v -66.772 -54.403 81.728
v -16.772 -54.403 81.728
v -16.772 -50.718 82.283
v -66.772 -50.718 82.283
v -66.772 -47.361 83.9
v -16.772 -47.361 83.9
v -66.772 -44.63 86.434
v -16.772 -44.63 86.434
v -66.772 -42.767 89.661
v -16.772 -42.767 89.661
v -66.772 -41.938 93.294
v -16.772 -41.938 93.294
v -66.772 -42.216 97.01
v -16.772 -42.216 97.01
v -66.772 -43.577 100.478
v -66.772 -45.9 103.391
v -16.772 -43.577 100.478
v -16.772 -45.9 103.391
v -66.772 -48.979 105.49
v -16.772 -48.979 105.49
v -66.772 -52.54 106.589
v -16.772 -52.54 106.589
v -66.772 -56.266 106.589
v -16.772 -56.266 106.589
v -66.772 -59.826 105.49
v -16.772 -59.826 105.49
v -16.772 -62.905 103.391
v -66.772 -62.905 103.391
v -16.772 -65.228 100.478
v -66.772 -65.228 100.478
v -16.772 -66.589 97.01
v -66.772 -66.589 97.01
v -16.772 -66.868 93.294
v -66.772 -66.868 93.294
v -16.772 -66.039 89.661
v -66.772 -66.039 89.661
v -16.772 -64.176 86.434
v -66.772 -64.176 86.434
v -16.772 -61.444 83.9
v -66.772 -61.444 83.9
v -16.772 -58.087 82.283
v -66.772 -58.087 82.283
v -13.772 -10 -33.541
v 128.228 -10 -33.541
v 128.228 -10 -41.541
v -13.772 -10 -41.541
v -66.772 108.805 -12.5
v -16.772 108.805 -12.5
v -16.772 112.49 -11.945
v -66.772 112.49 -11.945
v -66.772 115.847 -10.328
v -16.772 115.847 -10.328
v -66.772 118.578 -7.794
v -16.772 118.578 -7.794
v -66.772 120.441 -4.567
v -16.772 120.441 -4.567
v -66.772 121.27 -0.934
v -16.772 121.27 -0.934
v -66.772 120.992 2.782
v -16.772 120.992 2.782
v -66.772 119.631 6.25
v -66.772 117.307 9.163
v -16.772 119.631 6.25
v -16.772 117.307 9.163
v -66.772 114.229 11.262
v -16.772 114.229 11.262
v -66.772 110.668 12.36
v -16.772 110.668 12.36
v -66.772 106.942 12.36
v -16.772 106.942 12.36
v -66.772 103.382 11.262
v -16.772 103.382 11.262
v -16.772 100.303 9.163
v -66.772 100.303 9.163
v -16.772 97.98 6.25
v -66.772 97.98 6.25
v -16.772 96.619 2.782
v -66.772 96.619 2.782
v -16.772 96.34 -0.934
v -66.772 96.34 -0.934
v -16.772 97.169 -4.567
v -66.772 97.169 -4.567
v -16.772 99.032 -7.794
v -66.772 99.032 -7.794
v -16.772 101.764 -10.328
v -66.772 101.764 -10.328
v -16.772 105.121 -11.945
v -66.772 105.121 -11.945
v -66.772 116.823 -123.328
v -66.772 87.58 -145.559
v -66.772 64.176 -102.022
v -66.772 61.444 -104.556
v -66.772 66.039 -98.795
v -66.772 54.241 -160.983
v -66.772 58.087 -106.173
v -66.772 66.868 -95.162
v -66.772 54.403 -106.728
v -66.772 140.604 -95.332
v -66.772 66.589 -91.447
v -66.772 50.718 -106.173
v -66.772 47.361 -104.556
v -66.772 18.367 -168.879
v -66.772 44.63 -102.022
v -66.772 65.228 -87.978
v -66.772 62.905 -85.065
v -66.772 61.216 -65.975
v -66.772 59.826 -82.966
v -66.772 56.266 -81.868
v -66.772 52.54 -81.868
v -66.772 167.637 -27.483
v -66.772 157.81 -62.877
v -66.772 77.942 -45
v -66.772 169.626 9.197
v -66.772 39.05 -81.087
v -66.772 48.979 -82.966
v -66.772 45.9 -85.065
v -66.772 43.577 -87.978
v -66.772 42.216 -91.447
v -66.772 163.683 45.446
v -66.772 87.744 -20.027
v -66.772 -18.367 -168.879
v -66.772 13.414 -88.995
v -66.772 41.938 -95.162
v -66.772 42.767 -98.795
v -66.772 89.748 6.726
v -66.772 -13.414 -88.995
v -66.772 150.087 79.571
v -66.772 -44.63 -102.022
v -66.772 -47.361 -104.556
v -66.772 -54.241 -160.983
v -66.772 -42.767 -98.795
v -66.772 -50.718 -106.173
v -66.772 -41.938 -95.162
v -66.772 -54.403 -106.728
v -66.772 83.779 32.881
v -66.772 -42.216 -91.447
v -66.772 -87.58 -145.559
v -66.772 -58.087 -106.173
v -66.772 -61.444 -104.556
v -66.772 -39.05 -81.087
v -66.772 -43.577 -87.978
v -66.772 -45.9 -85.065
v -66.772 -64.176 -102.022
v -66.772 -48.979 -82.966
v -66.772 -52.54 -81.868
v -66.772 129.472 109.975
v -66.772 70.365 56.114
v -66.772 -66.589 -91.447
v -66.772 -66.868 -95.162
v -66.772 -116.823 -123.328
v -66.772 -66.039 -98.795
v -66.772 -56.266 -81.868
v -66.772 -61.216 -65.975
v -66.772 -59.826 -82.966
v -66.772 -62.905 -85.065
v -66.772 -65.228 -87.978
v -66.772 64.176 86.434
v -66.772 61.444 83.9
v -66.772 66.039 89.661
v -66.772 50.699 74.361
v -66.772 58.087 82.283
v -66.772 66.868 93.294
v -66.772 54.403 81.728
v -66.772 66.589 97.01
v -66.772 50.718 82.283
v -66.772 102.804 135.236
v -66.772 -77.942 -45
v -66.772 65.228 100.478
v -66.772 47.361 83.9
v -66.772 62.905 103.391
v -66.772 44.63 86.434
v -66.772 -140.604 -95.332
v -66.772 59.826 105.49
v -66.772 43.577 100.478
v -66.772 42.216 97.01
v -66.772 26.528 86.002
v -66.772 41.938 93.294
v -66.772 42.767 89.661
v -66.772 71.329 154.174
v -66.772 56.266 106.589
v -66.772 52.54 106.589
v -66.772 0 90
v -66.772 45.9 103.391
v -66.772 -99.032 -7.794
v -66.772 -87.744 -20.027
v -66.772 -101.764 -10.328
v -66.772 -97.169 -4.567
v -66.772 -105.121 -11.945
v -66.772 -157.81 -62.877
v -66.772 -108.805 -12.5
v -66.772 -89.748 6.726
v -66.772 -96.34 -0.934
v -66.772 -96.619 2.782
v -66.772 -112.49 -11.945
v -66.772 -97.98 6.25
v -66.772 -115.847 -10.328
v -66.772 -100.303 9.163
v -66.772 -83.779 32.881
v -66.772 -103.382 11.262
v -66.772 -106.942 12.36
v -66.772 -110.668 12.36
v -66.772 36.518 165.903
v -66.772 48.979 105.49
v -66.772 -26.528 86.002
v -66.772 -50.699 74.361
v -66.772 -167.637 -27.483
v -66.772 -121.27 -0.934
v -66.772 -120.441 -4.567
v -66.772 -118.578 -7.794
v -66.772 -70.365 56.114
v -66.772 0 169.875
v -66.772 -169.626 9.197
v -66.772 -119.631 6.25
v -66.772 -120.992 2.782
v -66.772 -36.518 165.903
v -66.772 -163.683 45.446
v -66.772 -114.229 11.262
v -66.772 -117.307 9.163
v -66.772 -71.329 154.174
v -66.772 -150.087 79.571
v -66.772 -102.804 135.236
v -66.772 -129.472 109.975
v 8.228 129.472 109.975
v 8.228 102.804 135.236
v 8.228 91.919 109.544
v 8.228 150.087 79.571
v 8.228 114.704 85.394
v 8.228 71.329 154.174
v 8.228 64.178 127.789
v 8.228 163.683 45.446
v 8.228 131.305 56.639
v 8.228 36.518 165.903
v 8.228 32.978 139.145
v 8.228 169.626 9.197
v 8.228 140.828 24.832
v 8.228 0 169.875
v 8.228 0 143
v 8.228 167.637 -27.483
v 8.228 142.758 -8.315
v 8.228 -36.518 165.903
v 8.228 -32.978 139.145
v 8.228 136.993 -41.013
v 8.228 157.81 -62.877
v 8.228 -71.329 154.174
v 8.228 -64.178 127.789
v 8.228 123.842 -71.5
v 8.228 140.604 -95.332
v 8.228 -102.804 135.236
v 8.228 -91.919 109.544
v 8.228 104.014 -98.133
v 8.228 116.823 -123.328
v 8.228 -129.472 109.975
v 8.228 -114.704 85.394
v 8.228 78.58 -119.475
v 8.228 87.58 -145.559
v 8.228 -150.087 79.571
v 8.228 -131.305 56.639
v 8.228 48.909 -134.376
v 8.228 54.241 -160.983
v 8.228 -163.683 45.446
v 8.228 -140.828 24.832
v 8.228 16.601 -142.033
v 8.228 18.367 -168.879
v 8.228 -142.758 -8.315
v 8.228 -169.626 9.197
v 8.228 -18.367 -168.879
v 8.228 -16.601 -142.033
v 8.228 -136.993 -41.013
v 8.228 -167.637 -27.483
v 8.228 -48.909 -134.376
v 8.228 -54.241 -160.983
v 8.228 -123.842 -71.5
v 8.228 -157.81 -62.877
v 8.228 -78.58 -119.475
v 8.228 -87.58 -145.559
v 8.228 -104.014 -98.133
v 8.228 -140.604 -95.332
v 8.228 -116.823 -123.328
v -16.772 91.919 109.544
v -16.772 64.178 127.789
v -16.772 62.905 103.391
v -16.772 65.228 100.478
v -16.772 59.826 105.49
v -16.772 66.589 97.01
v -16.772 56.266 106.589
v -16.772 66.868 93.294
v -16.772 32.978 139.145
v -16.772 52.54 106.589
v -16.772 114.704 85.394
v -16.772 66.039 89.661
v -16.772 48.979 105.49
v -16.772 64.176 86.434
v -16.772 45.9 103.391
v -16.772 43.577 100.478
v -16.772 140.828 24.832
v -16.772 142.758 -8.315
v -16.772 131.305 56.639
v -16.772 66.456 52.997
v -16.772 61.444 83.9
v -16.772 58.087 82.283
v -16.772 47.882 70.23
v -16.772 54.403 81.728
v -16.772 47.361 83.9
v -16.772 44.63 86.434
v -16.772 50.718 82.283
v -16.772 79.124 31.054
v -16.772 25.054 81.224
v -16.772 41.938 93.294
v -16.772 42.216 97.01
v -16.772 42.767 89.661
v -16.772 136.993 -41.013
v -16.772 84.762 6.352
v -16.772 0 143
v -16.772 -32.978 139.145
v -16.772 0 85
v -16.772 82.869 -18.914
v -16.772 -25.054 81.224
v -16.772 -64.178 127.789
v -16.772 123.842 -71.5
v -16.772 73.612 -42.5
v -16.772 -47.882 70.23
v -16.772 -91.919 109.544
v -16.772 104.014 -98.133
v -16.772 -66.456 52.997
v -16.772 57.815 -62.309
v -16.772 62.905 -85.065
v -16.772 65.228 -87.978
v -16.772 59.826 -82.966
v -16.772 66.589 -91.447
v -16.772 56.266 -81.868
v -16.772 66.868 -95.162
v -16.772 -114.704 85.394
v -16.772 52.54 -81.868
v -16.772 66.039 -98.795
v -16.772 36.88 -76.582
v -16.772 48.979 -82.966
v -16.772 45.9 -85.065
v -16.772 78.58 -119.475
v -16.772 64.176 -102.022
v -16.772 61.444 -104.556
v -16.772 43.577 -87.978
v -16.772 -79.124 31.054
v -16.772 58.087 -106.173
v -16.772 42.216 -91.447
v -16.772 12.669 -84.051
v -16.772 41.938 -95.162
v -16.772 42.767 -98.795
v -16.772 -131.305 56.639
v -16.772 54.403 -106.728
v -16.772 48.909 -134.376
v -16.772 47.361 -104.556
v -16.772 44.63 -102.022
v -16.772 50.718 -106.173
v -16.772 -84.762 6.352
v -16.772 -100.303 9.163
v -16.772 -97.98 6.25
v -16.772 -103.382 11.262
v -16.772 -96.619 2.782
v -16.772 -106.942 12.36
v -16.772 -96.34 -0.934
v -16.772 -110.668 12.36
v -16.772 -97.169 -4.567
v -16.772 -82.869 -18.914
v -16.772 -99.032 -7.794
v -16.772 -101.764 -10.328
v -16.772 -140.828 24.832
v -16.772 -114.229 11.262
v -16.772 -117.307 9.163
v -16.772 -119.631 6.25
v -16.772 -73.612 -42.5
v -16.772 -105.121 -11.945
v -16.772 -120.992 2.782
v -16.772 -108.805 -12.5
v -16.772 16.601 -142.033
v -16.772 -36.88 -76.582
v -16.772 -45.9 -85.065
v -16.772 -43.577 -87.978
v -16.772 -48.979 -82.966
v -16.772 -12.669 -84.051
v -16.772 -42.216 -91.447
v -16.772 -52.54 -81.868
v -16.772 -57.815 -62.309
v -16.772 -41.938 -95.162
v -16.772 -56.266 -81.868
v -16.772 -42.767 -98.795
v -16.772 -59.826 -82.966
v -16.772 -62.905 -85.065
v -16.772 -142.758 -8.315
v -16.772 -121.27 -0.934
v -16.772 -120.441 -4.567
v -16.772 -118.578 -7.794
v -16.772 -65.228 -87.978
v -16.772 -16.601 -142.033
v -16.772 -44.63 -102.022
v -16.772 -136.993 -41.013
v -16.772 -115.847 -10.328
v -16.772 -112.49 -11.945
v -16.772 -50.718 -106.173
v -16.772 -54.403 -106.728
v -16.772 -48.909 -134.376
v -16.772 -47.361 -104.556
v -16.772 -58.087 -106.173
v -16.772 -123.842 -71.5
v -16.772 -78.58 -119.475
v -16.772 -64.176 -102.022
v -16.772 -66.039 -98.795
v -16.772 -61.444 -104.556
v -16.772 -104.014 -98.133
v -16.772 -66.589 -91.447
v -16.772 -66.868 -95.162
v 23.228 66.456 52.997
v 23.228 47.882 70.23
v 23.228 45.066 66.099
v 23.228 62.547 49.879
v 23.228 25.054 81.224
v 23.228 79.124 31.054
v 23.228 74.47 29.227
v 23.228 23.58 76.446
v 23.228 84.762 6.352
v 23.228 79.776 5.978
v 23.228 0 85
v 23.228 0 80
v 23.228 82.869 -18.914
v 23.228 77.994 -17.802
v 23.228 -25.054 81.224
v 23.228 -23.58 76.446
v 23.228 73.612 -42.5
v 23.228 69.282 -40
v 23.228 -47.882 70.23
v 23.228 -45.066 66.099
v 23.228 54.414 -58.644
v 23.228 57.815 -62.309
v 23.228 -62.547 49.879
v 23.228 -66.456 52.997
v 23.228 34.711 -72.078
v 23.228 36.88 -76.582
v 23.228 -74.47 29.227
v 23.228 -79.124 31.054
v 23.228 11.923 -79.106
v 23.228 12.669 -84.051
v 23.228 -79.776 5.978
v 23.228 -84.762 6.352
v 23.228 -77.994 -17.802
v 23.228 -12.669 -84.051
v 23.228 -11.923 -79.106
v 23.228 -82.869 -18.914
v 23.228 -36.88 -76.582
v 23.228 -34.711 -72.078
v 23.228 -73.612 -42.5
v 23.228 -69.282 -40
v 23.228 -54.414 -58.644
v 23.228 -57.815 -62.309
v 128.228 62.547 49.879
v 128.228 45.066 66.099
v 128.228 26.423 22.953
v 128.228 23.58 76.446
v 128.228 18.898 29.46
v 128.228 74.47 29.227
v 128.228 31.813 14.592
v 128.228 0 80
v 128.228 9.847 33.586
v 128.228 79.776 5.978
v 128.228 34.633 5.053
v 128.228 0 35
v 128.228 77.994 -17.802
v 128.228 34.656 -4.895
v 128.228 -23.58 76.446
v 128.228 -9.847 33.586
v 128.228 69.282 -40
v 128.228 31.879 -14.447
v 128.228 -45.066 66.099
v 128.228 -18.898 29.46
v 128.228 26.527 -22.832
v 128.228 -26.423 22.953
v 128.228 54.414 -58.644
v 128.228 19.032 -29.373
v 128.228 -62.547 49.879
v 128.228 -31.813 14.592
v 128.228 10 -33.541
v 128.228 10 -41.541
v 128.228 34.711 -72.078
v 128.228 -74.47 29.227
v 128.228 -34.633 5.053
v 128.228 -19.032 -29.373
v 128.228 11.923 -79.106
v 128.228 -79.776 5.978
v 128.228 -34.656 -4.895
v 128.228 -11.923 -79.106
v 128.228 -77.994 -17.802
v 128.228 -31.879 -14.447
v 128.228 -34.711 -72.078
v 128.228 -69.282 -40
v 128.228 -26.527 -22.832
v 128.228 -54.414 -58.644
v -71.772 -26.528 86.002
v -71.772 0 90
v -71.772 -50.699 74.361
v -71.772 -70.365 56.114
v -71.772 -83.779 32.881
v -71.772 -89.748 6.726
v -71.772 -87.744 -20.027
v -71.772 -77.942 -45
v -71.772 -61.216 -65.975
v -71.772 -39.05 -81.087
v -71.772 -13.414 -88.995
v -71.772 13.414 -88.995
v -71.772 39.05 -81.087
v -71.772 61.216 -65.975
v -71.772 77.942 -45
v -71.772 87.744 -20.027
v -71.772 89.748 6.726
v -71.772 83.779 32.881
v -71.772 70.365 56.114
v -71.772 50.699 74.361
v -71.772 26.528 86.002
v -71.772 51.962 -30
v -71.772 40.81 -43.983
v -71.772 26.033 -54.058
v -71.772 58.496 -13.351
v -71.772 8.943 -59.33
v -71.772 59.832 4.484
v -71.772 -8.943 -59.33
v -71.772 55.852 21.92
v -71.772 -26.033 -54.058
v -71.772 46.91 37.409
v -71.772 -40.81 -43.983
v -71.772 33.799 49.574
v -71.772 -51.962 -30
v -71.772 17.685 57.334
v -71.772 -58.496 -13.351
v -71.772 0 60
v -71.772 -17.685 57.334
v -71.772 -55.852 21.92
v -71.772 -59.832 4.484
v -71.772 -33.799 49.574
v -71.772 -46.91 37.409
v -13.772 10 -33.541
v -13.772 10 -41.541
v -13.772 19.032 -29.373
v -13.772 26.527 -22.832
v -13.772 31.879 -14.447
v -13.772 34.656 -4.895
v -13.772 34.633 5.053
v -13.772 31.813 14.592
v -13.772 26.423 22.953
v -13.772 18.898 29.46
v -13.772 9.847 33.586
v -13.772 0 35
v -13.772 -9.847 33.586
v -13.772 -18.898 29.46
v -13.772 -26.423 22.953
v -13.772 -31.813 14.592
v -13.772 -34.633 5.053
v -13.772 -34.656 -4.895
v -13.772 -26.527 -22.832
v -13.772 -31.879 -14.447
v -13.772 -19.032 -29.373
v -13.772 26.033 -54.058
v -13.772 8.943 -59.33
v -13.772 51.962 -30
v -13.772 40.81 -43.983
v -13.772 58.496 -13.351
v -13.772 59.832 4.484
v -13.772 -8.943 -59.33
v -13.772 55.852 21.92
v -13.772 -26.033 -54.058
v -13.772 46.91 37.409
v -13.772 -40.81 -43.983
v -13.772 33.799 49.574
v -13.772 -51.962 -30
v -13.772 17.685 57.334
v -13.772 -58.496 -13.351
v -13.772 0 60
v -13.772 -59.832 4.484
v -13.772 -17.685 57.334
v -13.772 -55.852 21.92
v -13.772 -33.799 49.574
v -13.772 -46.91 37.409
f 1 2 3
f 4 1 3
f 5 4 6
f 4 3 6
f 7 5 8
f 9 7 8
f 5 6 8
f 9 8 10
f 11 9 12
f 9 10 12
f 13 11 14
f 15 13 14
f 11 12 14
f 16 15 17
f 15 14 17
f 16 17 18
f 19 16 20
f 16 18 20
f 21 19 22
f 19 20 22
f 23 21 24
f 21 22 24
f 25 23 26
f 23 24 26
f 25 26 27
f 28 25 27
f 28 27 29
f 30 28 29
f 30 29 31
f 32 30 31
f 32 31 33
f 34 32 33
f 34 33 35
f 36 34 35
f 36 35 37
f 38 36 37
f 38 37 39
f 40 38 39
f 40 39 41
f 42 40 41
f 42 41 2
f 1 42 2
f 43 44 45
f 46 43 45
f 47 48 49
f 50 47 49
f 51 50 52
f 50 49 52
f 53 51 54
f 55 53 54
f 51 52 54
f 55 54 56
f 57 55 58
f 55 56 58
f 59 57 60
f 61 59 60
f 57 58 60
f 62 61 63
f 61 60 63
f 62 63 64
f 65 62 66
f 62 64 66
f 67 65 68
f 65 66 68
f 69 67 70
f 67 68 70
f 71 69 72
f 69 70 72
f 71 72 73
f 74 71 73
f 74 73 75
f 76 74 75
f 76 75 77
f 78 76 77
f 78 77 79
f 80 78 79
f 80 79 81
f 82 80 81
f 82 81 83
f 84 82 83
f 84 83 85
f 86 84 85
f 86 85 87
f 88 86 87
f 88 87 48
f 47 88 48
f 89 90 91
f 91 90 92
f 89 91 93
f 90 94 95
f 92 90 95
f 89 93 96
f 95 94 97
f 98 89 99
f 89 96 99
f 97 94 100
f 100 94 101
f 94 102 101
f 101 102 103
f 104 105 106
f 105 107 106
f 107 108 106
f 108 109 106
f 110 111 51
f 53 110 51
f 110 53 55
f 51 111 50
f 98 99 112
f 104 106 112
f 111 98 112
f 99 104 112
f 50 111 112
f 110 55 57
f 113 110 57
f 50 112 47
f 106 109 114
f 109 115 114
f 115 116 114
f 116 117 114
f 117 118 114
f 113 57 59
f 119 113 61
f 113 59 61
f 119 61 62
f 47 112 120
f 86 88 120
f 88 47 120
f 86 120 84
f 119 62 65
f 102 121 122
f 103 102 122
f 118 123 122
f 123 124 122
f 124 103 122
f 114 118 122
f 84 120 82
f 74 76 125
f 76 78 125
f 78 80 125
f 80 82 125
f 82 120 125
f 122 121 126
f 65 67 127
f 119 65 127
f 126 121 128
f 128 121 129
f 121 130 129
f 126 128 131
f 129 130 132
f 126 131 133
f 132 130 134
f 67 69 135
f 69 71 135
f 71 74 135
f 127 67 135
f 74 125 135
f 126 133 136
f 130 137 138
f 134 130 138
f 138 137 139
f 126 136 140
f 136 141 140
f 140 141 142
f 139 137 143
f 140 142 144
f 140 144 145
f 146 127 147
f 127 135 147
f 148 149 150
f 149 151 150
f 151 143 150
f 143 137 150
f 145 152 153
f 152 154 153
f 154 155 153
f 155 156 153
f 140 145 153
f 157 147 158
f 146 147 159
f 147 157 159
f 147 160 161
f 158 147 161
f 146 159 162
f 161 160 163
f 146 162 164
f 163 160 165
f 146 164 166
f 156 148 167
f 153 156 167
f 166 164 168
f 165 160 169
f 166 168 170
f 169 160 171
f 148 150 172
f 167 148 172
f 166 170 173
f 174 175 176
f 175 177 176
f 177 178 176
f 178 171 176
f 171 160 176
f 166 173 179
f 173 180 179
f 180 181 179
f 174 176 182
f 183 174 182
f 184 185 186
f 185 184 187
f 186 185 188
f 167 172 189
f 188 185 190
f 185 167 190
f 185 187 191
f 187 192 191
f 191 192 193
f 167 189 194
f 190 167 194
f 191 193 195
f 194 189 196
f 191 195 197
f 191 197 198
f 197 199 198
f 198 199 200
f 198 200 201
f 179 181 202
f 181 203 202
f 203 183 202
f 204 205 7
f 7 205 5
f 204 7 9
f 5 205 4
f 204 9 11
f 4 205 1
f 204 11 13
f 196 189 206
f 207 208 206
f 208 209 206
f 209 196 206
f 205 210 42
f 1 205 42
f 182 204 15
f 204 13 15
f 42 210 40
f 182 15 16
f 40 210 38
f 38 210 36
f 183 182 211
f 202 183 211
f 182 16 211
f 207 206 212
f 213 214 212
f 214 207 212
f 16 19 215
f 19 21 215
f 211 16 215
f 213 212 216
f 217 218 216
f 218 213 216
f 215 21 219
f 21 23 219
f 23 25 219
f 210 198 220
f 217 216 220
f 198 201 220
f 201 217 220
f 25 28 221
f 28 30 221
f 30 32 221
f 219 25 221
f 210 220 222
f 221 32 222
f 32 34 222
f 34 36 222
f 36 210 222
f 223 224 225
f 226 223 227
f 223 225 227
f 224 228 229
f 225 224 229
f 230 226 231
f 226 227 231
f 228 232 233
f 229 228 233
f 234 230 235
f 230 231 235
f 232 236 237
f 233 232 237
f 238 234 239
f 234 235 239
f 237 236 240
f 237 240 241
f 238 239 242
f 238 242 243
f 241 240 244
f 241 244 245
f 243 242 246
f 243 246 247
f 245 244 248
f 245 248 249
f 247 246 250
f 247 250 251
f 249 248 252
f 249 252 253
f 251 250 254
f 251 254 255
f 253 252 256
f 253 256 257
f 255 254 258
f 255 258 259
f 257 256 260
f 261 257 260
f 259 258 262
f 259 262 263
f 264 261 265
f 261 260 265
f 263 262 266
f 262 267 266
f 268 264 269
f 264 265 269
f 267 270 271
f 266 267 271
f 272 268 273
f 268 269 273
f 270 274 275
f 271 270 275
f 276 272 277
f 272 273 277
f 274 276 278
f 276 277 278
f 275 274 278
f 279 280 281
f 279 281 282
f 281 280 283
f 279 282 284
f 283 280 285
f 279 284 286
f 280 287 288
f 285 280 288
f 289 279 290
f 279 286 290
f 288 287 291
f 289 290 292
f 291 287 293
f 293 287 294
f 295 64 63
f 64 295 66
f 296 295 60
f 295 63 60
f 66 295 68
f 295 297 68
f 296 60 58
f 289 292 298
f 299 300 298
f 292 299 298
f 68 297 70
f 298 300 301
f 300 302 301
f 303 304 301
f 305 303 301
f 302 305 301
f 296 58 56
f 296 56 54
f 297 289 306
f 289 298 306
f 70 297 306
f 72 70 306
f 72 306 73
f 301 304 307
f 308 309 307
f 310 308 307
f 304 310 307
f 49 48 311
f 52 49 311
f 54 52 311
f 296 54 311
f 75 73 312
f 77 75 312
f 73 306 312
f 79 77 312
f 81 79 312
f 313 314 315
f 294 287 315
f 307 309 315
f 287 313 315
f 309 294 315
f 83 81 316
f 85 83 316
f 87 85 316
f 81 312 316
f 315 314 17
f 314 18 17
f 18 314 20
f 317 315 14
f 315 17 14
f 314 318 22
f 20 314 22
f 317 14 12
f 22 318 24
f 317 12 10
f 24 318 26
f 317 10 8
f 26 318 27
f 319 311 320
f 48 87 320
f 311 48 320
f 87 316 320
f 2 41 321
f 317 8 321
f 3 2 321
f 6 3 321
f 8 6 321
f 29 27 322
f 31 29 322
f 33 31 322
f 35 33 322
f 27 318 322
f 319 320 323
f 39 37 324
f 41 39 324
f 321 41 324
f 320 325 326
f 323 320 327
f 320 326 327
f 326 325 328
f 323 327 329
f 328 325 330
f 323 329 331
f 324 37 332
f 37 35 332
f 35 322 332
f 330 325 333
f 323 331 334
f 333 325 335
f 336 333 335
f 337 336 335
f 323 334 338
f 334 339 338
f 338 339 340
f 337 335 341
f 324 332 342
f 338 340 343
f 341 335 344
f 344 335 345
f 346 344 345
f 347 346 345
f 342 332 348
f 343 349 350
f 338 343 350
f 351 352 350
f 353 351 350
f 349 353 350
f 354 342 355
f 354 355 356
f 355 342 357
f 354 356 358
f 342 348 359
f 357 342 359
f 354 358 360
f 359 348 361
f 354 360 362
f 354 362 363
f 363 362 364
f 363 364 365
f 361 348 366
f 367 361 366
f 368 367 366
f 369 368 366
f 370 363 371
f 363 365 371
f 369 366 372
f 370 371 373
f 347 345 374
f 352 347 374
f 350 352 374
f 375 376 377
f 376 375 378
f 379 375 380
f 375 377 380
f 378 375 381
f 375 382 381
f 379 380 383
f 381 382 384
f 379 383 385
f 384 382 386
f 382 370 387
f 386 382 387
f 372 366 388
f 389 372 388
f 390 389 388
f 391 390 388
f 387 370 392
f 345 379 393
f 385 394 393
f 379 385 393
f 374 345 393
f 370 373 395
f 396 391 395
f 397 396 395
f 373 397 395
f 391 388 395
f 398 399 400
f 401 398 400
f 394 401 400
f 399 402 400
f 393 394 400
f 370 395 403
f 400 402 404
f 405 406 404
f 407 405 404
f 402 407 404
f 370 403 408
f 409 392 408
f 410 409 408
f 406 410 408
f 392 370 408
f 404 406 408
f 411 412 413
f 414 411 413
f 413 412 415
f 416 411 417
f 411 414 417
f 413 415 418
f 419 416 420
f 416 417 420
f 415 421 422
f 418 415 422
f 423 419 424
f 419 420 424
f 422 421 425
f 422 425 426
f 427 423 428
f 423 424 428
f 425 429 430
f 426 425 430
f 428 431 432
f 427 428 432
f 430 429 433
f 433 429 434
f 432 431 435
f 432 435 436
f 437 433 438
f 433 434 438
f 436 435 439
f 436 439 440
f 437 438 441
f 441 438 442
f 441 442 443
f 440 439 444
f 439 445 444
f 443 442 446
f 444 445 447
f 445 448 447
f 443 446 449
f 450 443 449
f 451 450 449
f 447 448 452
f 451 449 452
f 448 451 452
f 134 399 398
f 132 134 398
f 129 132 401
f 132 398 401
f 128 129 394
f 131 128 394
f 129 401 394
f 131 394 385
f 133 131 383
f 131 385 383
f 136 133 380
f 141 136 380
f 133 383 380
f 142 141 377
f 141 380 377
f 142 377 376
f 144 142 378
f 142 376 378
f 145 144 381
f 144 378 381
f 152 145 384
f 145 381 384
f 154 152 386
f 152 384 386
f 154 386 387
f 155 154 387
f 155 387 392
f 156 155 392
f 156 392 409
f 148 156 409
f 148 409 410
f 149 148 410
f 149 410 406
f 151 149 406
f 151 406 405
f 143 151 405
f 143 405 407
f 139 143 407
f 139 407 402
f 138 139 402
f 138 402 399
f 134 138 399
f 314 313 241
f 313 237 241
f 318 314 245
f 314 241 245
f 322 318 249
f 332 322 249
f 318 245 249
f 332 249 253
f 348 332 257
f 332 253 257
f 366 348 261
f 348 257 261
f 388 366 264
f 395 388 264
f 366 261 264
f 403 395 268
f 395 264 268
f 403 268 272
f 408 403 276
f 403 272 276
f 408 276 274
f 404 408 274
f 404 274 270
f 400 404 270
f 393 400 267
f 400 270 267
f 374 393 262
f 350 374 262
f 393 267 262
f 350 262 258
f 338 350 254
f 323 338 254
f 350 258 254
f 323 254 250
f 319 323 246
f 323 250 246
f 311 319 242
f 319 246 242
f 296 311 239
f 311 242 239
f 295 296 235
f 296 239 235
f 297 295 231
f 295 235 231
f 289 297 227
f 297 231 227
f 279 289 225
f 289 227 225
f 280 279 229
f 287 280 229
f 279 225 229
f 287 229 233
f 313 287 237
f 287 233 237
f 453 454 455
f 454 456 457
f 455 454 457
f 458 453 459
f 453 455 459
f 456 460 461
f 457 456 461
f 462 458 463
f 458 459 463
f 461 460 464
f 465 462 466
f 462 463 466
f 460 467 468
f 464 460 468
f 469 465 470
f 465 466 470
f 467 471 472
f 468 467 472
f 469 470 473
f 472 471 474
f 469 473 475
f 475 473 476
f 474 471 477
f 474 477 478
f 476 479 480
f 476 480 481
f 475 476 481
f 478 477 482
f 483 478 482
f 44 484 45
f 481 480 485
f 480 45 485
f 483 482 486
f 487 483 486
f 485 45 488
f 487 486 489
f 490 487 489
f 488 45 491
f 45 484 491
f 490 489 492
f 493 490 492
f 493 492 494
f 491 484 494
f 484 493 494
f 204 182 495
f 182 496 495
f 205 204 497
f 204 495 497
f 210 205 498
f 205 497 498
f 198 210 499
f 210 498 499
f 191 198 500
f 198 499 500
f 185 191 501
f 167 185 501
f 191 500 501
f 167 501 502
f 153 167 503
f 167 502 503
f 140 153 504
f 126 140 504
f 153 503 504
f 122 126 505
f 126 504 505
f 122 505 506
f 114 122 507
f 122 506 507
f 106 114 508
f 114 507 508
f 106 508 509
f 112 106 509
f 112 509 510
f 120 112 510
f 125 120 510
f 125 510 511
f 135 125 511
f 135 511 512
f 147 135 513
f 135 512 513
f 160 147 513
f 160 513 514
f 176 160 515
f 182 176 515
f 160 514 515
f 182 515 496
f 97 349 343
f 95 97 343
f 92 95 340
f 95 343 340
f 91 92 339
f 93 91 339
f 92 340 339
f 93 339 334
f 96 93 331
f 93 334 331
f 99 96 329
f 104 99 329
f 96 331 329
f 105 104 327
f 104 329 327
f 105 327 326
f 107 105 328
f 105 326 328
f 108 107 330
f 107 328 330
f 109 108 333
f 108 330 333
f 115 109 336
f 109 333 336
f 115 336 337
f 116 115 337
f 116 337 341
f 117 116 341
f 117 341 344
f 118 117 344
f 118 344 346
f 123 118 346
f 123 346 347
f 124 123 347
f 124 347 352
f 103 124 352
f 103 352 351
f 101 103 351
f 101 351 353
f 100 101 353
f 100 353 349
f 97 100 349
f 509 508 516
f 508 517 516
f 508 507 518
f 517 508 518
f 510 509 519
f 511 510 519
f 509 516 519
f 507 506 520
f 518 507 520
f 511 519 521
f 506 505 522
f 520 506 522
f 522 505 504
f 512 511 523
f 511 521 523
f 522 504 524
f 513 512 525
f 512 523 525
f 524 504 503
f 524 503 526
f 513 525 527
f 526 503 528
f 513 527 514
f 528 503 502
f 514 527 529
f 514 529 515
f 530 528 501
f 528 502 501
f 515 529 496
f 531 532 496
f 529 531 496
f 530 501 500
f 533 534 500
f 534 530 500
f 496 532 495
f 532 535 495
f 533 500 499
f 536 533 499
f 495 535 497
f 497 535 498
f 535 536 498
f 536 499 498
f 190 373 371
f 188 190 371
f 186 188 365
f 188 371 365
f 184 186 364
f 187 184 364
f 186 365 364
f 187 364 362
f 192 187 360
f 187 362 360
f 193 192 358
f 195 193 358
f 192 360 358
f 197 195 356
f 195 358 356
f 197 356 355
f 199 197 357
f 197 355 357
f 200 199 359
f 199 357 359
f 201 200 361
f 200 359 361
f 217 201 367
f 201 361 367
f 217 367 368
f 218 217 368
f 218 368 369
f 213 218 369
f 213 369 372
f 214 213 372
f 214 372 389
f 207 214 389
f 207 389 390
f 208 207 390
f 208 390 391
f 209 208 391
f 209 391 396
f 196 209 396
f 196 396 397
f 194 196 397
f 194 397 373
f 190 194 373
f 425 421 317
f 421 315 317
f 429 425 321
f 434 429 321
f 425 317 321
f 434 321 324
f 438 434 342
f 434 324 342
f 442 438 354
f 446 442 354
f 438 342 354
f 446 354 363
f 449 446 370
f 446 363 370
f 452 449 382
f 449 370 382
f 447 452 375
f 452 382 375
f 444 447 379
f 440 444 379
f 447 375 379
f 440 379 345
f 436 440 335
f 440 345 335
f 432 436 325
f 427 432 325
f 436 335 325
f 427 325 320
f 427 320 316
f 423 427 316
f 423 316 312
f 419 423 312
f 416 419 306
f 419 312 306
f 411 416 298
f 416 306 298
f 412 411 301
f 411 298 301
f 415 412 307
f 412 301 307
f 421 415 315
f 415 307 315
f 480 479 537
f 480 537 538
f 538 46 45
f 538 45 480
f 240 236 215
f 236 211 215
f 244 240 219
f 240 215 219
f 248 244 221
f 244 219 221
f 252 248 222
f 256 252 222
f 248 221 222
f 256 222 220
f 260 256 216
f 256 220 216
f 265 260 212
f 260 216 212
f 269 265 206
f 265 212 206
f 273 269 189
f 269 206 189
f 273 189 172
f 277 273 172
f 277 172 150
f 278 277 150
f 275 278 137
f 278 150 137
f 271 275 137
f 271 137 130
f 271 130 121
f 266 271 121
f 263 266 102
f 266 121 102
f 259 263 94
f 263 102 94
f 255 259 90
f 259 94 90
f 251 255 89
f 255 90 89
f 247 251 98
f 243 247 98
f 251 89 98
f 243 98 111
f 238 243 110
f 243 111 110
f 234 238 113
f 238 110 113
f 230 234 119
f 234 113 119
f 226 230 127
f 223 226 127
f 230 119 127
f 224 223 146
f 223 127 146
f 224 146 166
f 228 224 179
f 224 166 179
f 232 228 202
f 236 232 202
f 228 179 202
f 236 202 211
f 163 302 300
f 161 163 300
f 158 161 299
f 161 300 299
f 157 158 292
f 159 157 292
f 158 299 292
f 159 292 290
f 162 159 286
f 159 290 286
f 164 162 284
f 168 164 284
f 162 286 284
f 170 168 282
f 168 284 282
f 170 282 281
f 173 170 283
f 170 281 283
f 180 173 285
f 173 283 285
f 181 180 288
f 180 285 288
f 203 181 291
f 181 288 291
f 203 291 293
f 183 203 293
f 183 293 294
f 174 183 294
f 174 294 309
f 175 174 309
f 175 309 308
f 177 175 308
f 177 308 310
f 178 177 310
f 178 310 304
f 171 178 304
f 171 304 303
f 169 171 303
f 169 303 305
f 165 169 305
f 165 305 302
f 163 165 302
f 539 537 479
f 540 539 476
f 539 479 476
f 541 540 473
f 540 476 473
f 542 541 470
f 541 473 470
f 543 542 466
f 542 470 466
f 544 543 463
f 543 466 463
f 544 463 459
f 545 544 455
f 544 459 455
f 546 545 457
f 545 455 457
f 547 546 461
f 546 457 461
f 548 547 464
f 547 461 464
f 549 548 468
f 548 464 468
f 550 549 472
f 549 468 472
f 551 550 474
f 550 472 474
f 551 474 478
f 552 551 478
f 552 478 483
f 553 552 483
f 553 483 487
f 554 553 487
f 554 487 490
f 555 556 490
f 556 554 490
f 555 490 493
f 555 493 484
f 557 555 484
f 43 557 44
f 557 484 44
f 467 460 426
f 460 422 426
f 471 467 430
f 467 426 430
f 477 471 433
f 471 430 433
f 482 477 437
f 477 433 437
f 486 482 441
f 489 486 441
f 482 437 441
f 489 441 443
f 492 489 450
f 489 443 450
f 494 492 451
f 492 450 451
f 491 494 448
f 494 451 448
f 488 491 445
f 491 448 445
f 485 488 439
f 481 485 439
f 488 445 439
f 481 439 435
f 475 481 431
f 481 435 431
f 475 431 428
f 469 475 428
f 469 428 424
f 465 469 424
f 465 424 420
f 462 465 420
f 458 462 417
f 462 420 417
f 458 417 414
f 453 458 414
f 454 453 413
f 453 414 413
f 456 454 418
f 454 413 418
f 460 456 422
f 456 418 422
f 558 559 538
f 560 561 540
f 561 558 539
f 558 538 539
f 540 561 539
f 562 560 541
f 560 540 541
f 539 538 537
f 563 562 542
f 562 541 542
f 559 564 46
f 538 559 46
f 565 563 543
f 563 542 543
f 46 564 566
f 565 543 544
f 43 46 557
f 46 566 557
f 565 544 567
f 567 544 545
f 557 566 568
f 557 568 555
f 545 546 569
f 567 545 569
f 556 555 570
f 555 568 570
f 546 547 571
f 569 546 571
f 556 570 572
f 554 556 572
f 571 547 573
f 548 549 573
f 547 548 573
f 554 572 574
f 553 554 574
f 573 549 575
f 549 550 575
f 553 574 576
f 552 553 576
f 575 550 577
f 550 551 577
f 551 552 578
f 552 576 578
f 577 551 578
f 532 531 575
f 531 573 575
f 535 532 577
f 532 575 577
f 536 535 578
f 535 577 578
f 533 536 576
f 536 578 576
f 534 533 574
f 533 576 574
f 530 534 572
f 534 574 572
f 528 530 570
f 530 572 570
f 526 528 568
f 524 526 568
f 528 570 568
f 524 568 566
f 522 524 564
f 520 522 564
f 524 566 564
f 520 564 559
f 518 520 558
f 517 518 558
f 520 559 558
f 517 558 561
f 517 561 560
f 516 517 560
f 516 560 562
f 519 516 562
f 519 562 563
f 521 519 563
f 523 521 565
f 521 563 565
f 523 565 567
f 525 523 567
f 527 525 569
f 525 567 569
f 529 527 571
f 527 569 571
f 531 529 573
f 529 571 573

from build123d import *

# Parameters (mm, degrees)
SKETCH2_W          = 8
SKETCH2_H          = 20
CUT_EXTRUDE1_DEPTH = 313.594035852
SKETCH3_R          = 12.5
CUT_EXTRUDE2_DEPTH = 281.606541709


with BuildPart() as part:
    # Sketch1 → Revolve1 (revolve)
    with BuildSketch(Plane(origin=(0, 0, 0), x_dir=(1, 0, 0), z_dir=(0, 1, 0)), mode=Mode.PRIVATE) as revolve1_sk:
        Polygon((-13.77173913, 35), (128.22826087, 35), (128.22826087, 80), (23.22826087, 80), (23.22826087, 85), (-16.77173913, 85), (-16.77173913, 143), (8.22826087, 143), (8.22826087, 169.875), (-66.77173913, 169.875), (-66.77173913, 90), (-71.77173913, 90), (-71.77173913, 60), (-13.77173913, 60), align=None)
    revolve(revolve1_sk.sketch.rotate(Axis((-159.75, 0, 0), (1, 0, 0)), 180), axis=Axis((-159.75, 0, 0), (1, 0, 0)))

    # Sketch2 → Cut-Extrude1 (cut, through all)
    with BuildSketch(Plane(origin=(128.22826087, 0, 0), x_dir=(0, 0, -1), z_dir=(1, 0, 0))):
        with Locations((37.541019662, 0)):
            Rectangle(SKETCH2_W, SKETCH2_H)
    extrude(amount=-CUT_EXTRUDE1_DEPTH, mode=Mode.SUBTRACT)

    # Sketch3 → Cut-Extrude2 (cut, through all)
    with BuildSketch(Plane(origin=(-16.77173913, 0, 0), x_dir=(0, 0, -1), z_dir=(1, 0, 0))):
        with Locations((0, 108.805263326)):
            Circle(SKETCH3_R)
        with Locations((94.228122106, 54.402631663)):
            Circle(SKETCH3_R)
        with Locations((94.228122106, -54.402631663)):
            Circle(SKETCH3_R)
        with Locations((0, -108.805263326)):
            Circle(SKETCH3_R)
        with Locations((-94.228122106, -54.402631663)):
            Circle(SKETCH3_R)
        with Locations((-94.228122106, 54.402631663)):
            Circle(SKETCH3_R)
    extrude(amount=-CUT_EXTRUDE2_DEPTH, mode=Mode.SUBTRACT)


solid = part.part
